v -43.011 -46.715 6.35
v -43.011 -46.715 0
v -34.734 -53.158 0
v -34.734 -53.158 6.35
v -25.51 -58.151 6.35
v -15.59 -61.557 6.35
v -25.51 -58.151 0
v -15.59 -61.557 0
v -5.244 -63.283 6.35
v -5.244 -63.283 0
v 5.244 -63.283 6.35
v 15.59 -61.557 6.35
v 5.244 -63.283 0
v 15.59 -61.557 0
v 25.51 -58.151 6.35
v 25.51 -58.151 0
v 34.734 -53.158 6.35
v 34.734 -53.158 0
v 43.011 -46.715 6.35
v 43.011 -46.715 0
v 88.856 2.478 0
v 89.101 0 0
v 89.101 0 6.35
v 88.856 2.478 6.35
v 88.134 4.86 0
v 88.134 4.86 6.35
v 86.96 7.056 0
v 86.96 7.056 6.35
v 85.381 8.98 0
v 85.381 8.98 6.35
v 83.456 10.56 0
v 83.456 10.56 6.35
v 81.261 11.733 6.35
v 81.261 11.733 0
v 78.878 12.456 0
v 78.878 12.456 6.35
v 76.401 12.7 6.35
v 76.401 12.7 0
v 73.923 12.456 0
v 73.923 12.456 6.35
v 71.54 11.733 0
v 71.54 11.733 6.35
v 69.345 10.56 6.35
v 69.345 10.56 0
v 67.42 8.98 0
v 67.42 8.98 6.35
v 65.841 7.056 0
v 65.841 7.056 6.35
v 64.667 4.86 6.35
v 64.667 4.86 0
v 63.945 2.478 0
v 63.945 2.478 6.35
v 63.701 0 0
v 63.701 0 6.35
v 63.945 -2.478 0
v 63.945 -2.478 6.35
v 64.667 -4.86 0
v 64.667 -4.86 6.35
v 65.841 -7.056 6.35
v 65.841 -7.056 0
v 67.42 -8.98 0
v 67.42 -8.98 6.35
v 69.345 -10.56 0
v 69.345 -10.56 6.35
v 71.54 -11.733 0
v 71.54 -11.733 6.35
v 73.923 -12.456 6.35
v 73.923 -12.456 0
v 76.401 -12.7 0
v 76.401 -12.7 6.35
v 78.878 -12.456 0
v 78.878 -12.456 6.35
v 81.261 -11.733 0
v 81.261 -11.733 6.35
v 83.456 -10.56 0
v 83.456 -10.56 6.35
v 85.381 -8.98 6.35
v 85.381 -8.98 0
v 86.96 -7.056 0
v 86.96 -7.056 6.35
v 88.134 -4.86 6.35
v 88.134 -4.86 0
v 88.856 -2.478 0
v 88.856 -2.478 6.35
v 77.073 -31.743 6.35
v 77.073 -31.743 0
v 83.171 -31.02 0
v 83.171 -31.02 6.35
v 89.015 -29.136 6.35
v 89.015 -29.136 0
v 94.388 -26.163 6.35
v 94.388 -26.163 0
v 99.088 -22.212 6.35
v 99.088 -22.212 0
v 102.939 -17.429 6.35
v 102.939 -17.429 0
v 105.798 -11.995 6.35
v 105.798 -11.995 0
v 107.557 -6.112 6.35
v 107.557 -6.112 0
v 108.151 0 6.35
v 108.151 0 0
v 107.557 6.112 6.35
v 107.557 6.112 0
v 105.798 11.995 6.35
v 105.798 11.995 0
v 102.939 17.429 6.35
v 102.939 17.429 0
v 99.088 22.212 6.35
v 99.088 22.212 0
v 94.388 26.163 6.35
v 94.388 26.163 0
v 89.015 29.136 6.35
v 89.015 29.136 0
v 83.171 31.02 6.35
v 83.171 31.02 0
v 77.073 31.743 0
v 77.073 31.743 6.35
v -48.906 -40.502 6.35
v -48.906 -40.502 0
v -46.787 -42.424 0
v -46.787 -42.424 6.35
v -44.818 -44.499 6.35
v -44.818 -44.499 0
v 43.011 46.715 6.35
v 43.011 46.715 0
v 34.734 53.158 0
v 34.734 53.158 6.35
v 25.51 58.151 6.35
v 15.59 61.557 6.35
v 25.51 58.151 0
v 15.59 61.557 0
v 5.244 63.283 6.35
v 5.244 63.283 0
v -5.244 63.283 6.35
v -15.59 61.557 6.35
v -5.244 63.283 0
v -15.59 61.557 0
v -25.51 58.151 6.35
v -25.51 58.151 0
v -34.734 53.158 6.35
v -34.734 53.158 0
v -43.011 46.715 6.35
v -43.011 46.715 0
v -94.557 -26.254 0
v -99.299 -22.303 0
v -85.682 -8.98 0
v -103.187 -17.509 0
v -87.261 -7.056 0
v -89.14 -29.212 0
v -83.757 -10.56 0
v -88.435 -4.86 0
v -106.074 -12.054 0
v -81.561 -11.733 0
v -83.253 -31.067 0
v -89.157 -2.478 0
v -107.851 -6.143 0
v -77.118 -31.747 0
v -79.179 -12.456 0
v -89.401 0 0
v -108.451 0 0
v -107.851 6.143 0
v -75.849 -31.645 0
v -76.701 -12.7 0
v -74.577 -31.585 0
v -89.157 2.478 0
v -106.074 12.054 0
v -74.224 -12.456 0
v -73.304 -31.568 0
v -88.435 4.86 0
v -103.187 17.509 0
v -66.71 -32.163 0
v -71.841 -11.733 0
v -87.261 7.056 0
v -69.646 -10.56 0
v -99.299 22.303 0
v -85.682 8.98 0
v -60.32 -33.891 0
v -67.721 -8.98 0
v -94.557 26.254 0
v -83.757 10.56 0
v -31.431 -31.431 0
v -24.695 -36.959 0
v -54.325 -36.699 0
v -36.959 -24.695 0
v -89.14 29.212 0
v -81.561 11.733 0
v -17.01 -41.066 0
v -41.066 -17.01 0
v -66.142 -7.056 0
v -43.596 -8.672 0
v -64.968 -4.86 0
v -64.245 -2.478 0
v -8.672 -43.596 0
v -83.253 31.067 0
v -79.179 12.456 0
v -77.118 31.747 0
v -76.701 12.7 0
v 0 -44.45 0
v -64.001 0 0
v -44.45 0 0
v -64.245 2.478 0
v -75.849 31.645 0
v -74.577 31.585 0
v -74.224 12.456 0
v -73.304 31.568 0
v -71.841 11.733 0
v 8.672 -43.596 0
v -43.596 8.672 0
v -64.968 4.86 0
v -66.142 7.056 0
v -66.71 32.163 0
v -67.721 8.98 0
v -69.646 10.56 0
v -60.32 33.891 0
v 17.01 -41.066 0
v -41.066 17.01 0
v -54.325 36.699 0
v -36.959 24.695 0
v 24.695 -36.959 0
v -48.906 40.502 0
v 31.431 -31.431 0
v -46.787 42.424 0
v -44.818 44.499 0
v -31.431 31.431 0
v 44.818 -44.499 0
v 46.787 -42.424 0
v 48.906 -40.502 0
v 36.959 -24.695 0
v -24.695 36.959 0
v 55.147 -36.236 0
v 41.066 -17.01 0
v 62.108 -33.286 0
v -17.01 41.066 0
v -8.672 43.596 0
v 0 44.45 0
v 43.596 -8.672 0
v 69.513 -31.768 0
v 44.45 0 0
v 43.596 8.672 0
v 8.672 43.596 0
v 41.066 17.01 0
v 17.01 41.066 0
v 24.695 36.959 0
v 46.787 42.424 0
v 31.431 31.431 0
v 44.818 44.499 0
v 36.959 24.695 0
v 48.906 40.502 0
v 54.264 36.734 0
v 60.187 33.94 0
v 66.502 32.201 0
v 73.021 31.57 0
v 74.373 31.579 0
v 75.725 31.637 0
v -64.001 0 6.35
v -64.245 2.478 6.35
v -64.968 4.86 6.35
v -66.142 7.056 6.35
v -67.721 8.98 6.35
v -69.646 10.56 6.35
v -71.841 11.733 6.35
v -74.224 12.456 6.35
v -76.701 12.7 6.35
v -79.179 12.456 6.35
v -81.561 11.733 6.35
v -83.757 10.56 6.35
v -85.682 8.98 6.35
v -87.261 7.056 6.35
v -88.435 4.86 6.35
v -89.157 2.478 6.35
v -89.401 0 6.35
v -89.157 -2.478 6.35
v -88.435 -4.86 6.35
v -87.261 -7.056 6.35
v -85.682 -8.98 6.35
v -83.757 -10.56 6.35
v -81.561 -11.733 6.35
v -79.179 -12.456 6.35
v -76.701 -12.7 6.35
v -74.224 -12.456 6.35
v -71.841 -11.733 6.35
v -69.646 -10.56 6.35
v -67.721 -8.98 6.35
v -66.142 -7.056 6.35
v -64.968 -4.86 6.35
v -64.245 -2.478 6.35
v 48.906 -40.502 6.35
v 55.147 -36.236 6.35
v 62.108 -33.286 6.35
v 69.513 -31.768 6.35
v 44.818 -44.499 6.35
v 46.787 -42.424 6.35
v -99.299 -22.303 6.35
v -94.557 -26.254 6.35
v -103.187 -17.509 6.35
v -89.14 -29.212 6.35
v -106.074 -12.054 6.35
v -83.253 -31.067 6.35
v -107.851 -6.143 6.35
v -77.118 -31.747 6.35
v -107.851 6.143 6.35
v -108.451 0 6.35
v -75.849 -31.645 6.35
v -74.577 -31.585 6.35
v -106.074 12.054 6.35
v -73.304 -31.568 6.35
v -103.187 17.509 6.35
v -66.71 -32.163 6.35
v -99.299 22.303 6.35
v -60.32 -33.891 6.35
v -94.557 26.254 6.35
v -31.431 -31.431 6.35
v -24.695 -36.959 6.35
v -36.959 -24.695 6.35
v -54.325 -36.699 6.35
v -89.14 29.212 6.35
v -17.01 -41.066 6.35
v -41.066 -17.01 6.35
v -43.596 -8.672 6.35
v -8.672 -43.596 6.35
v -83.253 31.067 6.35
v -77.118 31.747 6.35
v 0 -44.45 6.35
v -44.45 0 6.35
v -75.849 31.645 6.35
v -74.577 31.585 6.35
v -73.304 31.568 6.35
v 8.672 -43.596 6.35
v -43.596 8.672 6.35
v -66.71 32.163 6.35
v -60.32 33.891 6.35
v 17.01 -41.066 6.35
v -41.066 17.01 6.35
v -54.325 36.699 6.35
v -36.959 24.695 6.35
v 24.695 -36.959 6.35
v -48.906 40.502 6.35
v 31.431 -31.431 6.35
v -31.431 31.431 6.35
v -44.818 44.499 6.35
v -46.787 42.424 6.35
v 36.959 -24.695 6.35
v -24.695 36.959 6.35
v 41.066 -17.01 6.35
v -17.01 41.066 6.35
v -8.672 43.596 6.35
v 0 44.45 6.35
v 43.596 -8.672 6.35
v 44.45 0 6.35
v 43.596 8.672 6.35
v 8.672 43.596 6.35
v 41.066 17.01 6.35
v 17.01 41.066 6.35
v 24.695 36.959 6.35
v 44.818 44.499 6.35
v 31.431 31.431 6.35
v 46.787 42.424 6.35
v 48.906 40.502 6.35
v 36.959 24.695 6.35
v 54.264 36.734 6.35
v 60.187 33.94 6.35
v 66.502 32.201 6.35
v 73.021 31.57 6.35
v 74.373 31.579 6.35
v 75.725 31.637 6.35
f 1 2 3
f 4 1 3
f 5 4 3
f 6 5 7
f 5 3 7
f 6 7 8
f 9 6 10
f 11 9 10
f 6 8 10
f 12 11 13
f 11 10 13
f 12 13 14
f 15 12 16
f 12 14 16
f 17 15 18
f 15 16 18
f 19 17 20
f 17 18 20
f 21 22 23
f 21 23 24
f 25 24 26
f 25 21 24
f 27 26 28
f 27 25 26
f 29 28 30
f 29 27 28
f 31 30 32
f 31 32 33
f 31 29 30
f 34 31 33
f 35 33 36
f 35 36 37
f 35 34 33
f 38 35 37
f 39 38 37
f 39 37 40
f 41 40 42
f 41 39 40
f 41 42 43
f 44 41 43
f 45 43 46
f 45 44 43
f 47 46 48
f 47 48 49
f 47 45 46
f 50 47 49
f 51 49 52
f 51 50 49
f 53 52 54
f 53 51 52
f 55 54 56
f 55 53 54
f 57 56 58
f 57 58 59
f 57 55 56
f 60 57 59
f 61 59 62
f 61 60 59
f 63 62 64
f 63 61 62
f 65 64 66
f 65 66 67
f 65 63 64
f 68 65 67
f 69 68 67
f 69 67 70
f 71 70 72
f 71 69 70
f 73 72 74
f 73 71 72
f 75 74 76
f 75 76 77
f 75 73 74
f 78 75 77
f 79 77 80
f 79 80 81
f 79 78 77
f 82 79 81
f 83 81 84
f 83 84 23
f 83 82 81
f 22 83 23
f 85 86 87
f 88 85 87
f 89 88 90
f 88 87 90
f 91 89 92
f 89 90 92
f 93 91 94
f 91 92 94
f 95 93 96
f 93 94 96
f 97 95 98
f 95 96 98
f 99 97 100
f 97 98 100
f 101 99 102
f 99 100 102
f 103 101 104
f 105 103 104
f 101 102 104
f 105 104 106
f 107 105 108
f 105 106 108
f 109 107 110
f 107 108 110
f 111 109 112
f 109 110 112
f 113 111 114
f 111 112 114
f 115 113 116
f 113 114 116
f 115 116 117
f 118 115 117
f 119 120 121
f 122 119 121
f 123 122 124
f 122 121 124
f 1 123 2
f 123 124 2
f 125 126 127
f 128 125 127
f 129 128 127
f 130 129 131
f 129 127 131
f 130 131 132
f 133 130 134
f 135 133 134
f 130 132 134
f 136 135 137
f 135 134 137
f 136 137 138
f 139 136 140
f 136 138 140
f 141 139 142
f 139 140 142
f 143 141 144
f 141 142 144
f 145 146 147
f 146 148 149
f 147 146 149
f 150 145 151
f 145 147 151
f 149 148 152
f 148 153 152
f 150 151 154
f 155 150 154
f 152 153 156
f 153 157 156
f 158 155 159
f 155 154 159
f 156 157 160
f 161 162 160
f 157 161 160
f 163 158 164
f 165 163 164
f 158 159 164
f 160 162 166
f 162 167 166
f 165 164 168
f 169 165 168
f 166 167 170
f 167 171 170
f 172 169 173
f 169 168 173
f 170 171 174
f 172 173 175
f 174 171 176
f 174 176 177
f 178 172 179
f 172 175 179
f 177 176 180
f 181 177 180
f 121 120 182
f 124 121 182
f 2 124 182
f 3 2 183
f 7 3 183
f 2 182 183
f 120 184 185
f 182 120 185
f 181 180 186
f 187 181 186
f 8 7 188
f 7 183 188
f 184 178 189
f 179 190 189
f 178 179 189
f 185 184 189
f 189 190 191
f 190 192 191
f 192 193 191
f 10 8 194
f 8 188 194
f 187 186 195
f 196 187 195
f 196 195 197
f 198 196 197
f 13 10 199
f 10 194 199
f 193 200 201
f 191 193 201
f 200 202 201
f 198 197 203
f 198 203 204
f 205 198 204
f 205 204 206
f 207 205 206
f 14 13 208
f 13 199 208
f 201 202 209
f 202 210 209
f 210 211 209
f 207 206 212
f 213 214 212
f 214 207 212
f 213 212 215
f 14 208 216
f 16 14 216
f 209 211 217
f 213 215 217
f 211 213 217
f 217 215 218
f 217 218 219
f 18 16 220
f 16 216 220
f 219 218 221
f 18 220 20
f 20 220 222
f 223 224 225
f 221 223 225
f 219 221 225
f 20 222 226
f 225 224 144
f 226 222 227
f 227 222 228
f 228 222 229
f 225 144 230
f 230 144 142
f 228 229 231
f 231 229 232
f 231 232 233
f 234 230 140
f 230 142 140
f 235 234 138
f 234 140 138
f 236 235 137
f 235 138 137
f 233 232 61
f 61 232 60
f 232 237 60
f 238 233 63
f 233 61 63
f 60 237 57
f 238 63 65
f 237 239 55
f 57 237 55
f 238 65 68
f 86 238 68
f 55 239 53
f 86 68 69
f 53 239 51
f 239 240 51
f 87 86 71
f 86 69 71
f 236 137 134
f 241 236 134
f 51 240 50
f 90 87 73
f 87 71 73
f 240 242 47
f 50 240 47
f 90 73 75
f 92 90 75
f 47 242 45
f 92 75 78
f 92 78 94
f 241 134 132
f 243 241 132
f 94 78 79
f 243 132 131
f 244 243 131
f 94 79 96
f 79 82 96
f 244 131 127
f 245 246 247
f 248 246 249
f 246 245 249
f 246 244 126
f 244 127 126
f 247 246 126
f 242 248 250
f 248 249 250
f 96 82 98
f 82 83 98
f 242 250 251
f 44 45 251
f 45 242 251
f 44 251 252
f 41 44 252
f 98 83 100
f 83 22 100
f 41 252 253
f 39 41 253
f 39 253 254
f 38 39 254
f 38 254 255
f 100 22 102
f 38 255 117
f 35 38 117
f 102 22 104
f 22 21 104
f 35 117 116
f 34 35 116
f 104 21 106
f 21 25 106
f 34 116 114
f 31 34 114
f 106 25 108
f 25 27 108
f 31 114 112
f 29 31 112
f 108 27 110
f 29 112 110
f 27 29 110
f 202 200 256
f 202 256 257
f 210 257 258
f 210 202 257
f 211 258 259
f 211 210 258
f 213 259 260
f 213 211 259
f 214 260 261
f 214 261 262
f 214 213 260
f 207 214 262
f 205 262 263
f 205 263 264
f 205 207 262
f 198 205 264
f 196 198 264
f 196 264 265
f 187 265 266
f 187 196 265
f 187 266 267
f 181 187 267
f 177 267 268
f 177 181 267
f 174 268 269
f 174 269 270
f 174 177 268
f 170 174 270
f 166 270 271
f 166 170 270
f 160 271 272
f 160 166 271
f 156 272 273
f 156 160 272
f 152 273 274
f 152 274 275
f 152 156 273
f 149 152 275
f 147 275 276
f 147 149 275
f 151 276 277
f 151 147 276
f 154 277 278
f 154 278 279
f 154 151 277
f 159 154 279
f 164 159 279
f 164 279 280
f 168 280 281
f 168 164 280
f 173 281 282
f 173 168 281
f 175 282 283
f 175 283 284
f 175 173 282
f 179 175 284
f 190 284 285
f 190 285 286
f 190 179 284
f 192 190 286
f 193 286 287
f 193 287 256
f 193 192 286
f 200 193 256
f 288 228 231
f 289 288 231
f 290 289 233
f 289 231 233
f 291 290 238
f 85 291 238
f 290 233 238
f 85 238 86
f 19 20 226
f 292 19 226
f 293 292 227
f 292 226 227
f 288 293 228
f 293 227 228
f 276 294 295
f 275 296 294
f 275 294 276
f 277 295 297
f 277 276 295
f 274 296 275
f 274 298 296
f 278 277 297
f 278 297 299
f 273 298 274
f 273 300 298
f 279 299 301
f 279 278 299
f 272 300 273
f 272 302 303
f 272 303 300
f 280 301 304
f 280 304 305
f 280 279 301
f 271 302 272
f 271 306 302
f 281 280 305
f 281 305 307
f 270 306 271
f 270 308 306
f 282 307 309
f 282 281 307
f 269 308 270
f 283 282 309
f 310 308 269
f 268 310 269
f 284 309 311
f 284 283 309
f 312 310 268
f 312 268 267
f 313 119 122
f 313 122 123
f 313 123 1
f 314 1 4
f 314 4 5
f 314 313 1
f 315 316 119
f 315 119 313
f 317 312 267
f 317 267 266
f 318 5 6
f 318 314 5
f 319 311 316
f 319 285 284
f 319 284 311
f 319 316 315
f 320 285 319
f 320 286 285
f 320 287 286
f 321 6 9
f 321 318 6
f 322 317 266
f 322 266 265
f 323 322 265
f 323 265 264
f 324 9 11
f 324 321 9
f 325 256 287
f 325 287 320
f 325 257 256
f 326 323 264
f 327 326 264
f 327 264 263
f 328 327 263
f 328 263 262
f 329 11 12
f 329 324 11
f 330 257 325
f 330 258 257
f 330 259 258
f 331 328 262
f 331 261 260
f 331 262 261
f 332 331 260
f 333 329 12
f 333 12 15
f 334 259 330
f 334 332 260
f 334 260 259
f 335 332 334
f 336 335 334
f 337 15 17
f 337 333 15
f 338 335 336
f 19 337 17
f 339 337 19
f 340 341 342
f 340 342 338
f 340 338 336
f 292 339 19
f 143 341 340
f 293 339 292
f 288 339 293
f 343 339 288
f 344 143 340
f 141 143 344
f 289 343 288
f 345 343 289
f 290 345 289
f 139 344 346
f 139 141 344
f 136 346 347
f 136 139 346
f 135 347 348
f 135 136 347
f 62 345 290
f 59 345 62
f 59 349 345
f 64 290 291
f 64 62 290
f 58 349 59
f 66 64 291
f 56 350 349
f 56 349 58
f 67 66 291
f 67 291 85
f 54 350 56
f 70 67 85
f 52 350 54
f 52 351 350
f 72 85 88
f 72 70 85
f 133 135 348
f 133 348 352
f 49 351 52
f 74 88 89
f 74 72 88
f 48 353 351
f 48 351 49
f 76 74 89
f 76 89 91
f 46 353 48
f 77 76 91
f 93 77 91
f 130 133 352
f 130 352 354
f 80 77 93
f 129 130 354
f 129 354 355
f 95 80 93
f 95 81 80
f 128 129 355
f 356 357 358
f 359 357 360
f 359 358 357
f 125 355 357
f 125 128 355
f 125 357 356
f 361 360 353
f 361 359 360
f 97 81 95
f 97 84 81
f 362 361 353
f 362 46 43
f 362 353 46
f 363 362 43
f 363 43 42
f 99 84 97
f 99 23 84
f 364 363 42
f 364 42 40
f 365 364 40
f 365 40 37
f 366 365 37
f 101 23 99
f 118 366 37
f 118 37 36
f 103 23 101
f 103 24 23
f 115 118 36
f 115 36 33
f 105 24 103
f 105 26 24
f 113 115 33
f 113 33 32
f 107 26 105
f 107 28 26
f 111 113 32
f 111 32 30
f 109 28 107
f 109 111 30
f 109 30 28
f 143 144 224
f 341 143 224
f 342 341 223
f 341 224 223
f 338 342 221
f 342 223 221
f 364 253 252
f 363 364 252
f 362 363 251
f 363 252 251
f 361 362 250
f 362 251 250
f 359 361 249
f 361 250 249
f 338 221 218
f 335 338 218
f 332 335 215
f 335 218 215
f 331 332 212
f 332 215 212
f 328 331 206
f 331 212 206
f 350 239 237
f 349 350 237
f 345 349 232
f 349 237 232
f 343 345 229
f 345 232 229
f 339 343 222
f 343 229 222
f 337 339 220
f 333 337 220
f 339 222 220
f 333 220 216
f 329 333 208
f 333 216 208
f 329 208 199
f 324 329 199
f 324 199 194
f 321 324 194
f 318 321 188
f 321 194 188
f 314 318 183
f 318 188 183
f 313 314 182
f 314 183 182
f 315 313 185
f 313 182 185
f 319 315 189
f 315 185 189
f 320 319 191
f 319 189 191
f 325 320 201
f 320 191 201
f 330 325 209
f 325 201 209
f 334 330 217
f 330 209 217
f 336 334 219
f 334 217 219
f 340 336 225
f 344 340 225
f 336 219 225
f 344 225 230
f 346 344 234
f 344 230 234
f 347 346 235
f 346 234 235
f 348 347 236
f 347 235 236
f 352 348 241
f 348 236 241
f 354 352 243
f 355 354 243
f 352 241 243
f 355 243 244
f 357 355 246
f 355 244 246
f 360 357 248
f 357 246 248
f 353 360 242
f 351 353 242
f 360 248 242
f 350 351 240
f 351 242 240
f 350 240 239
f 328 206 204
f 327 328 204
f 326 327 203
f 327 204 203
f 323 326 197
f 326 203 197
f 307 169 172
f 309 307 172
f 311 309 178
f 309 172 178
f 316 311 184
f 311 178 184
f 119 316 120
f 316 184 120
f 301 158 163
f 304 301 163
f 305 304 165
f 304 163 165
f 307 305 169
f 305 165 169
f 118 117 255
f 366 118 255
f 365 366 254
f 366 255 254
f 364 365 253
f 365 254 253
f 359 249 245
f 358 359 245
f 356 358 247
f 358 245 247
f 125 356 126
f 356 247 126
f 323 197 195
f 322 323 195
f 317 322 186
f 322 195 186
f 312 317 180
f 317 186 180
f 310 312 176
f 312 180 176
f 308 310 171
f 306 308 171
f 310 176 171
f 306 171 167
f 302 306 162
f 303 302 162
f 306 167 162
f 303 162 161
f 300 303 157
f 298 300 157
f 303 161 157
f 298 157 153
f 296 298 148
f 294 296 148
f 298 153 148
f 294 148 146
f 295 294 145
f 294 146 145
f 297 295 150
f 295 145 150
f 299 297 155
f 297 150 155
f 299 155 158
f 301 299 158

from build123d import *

# Parameters (mm, degrees)
F0_R     = 12.7
F1_DEPTH = 6.35


with BuildPart() as f1:
    # F0 (on Top) → F1 (new body)
    with BuildSketch(Plane.XY):
        with BuildLine():
            ThreePointArc((-73.303587, -31.567672), (-60.319875, -33.890968), (-48.906375, -40.502055))
            ThreePointArc((-48.906375, -40.502055), (-45.783372, -43.442534), (-43.010688, -46.715423))
            ThreePointArc((-43.010688, -46.715423), (0, -63.5), (43.010688, -46.715423))
            ThreePointArc((43.010688, -46.715423), (45.783372, -43.442534), (48.906375, -40.502055))
            ThreePointArc((48.906375, -40.502055), (62.107619, -33.286067), (77.072974, -31.742878))
            ThreePointArc((77.072974, -31.742878), (108.150526, 0), (77.072974, 31.742878))
            ThreePointArc((77.072974, 31.742878), (75.049156, 31.602276), (73.020724, 31.569597))
            ThreePointArc((73.020724, 31.569597), (60.187156, 33.93985), (48.906375, 40.502055))
            ThreePointArc((48.906375, 40.502055), (45.783372, 43.442534), (43.010688, 46.715423))
            ThreePointArc((43.010688, 46.715423), (0, 63.5), (-43.010688, 46.715423))
            ThreePointArc((-43.010688, 46.715423), (-45.783372, 43.442534), (-48.906375, 40.502055))
            ThreePointArc((-48.906375, 40.502055), (-60.319875, 33.890968), (-73.303587, 31.567672))
            ThreePointArc((-73.303587, 31.567672), (-75.213159, 31.609643), (-77.118228, 31.747263))
            ThreePointArc((-77.118228, 31.747263), (-108.451321, 0), (-77.118228, -31.747263))
            ThreePointArc((-77.118228, -31.747263), (-75.213159, -31.609643), (-73.303587, -31.567672))
        make_face()
        with Locations((-76.701321, 0)):
            Circle(F0_R, mode=Mode.SUBTRACT)
        with BuildLine():
            ThreePointArc((-44.45, 0), (0, 44.45), (44.45, 0))
            ThreePointArc((44.45, 0), (0, -44.45), (-44.45, 0))
        make_face(mode=Mode.SUBTRACT)
        with Locations((76.400526, 0)):
            Circle(F0_R, mode=Mode.SUBTRACT)
    extrude(amount=F1_DEPTH)


solid = f1.part
